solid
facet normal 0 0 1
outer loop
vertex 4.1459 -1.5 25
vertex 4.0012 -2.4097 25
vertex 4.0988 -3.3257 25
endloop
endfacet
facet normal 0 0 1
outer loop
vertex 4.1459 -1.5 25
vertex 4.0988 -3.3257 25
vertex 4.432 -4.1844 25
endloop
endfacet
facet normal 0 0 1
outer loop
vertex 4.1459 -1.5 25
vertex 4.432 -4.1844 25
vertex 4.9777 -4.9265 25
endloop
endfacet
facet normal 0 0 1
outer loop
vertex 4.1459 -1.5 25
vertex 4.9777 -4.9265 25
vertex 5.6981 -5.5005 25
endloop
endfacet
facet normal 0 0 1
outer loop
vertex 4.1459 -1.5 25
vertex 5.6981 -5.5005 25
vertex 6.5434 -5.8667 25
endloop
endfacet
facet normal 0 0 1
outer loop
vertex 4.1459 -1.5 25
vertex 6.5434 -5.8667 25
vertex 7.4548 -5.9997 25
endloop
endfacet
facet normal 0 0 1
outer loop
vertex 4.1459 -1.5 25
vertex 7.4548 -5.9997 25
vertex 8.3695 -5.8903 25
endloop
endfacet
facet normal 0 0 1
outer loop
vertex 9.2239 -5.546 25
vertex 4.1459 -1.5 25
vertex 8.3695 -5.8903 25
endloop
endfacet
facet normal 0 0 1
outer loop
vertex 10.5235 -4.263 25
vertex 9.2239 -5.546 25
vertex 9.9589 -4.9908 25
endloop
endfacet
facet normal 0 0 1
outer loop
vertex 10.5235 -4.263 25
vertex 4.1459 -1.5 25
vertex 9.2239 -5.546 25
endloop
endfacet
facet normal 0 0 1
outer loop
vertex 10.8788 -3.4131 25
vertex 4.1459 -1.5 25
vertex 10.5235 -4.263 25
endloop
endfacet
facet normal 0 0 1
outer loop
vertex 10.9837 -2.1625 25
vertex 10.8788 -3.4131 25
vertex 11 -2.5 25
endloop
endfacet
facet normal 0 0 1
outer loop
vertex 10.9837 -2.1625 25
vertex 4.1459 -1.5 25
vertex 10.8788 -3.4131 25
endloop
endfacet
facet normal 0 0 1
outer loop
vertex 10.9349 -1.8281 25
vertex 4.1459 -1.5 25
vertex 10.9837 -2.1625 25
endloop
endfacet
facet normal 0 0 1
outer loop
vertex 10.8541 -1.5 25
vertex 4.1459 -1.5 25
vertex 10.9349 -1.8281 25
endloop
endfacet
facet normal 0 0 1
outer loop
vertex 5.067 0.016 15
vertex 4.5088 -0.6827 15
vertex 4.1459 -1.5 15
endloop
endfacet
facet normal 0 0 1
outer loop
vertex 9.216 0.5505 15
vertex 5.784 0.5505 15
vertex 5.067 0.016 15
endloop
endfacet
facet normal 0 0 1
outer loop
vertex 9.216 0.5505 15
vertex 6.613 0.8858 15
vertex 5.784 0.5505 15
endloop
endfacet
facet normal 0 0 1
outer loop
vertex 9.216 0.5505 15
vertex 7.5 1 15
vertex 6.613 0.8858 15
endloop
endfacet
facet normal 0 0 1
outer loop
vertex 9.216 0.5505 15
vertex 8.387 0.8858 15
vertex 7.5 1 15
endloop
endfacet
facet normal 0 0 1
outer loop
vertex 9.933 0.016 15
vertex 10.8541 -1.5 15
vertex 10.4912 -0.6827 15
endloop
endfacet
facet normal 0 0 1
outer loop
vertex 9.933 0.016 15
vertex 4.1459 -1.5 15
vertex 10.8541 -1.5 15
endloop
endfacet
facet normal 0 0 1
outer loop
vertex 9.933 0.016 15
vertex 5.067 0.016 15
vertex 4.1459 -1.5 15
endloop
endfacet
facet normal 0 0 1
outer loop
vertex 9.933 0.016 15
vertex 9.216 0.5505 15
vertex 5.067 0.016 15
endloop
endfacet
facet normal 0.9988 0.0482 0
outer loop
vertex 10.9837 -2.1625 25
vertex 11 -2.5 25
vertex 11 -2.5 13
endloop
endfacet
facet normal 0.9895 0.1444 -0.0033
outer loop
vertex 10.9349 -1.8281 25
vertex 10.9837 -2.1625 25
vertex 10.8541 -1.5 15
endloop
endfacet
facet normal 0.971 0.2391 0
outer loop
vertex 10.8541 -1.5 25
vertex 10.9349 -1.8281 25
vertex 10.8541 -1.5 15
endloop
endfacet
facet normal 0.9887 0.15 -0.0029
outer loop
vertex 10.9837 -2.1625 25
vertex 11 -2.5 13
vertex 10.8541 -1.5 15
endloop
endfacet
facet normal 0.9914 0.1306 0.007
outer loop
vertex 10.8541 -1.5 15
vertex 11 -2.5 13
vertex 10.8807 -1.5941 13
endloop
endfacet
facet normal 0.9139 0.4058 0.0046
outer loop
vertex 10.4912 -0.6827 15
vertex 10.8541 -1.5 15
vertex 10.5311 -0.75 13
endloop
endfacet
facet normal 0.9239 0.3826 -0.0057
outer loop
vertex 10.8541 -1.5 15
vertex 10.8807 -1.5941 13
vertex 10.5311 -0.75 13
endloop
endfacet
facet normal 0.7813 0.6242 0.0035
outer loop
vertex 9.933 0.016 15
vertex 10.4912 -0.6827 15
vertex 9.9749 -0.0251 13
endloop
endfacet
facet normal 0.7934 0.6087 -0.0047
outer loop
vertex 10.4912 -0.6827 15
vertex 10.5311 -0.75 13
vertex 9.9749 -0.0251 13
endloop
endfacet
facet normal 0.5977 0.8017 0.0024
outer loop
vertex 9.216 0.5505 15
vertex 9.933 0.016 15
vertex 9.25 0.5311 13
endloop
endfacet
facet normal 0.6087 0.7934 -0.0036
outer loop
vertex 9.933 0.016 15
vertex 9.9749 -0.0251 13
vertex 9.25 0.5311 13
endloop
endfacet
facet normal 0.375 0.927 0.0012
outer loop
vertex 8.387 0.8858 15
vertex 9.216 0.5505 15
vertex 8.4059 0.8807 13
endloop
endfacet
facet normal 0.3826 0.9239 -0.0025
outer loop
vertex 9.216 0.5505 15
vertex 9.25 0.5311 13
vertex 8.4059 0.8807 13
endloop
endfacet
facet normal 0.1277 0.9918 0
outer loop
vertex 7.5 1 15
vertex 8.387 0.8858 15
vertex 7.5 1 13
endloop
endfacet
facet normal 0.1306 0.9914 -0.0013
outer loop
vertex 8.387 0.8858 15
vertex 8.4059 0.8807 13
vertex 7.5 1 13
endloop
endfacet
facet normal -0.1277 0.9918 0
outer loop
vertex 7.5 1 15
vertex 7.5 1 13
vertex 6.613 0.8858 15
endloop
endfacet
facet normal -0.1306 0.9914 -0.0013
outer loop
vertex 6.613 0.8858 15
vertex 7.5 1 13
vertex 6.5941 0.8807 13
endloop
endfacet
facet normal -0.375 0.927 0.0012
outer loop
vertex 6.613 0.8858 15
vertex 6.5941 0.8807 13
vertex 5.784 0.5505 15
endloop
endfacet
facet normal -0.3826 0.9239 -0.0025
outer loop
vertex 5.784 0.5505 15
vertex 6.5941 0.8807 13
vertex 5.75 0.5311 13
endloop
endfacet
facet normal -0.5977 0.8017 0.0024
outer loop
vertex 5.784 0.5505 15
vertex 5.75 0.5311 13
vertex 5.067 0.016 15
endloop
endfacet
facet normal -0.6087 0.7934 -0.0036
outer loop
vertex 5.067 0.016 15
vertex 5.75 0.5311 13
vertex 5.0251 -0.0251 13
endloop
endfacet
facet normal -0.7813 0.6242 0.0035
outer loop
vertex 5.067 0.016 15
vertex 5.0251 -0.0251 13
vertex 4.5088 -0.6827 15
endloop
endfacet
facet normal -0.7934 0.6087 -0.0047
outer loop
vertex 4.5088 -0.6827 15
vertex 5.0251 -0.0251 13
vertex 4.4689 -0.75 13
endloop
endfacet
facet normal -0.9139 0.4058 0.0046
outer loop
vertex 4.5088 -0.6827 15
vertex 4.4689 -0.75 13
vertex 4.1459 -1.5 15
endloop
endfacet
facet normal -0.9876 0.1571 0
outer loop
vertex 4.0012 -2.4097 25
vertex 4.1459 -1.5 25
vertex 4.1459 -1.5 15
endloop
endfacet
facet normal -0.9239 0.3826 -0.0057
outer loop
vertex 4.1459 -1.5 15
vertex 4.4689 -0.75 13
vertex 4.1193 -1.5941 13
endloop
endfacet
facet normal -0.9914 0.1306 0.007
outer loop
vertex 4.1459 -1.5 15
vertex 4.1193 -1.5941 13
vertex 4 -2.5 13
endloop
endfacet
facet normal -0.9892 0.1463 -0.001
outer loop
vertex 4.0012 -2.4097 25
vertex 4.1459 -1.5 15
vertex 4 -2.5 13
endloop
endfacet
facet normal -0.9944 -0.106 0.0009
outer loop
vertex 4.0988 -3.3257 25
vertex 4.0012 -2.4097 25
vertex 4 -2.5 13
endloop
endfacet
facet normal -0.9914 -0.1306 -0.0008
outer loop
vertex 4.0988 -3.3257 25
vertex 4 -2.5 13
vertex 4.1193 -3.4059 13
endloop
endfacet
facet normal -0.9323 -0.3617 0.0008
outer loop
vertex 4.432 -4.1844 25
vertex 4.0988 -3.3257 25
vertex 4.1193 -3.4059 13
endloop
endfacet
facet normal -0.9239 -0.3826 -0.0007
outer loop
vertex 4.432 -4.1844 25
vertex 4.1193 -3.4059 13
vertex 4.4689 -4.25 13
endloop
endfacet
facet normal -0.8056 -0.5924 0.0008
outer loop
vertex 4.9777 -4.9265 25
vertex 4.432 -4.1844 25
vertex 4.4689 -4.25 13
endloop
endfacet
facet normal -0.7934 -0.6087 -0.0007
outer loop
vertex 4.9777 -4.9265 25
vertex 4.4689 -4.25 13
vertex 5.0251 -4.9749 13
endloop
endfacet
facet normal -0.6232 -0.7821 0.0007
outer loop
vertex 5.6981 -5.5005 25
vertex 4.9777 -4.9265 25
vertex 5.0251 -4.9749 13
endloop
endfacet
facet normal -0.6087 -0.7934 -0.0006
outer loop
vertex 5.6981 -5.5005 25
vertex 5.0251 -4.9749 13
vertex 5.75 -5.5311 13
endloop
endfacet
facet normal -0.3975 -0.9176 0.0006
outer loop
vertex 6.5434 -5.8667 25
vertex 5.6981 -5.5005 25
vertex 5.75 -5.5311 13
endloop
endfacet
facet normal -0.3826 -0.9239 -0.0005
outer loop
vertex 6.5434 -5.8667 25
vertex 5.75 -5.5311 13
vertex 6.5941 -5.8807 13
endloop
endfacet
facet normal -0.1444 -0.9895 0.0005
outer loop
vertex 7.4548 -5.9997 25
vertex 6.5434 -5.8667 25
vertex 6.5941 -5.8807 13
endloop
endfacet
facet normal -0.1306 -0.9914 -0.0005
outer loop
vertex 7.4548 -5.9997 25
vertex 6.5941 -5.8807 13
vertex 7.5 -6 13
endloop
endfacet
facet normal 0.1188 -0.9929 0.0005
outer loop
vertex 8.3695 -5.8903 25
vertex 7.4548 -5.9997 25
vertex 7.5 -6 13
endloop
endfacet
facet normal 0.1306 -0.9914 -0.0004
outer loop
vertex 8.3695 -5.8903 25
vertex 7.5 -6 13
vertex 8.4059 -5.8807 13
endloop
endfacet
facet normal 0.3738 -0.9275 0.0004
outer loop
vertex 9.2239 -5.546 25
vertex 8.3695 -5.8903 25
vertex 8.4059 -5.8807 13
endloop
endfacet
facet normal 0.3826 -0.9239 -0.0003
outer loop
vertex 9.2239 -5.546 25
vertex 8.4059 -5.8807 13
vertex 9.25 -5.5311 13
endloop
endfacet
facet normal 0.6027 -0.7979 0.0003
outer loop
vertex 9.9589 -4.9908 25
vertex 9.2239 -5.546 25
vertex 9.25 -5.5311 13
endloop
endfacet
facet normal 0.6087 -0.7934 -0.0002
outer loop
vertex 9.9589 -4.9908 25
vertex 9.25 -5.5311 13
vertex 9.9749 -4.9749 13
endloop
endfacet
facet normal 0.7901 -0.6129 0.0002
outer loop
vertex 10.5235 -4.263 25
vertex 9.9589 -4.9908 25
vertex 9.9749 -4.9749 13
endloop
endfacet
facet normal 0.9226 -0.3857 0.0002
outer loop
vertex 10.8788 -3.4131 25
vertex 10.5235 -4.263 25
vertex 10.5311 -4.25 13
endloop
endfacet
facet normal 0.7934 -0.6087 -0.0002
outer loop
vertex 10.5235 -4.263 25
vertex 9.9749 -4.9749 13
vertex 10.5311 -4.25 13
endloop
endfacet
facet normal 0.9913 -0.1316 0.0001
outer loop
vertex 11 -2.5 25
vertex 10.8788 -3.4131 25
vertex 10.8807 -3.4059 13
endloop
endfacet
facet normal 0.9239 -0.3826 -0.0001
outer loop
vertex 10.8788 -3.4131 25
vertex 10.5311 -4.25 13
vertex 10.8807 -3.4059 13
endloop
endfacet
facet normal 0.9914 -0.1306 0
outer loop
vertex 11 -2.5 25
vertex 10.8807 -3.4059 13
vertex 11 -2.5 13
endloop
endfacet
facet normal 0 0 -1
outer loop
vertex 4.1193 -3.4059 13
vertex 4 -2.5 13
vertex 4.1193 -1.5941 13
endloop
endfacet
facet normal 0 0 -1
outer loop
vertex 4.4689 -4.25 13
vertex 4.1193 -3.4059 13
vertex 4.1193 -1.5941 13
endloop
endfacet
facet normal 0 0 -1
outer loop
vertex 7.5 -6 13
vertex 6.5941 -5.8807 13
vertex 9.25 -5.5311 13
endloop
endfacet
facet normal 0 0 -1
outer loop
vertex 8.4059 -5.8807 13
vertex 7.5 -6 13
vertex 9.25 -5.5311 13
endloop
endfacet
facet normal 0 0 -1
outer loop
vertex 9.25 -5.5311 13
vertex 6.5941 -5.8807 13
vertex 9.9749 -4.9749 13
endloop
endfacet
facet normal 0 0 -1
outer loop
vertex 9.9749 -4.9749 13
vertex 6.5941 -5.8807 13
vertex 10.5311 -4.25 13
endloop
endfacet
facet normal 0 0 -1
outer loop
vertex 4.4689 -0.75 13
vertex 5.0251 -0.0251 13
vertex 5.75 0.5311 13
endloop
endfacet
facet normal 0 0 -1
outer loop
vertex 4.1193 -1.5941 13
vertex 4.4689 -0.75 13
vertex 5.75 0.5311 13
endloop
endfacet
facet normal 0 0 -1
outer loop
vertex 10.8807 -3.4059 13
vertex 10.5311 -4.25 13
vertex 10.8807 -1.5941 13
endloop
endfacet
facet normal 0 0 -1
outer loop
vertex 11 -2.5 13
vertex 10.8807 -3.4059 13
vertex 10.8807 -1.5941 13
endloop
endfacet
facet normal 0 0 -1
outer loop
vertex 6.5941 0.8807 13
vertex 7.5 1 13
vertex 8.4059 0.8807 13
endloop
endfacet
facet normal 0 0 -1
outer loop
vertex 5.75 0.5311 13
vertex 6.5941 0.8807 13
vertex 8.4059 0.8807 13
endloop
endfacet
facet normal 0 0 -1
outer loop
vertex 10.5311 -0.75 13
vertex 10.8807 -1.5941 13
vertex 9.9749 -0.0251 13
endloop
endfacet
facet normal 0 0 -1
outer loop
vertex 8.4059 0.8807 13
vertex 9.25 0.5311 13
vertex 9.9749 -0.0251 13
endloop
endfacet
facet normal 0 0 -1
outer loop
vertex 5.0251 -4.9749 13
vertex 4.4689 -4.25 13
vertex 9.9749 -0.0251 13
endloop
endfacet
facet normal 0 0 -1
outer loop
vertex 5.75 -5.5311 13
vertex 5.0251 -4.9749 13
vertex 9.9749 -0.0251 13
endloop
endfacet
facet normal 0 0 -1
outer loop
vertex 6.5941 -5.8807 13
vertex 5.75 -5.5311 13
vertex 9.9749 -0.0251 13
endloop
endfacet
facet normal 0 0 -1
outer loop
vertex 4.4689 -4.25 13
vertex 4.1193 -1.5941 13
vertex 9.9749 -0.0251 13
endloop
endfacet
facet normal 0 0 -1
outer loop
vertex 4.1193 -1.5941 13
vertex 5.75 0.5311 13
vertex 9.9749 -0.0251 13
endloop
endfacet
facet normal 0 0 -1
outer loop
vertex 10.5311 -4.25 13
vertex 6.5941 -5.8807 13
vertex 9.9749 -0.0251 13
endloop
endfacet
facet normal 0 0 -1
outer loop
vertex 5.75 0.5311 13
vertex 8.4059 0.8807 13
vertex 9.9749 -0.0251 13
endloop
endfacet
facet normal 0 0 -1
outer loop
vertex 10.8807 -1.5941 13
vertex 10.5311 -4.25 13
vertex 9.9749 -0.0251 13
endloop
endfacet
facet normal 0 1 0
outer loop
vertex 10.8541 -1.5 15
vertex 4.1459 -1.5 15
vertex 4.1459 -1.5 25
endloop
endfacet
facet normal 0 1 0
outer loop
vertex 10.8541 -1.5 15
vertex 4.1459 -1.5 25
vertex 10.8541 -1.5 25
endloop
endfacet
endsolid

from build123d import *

# Parameters (mm, degrees)
BOX001_W          = 10
BOX001_H          = 10
BOX001_DEPTH      = 10
CYLINDER002_R     = 3.5
CYLINDER002_DEPTH = 12


with BuildPart() as w_rfel001:
    # Box001 → Box001 (new body)
    with BuildSketch(Plane(origin=(2, -1.5, 15), x_dir=(1, 0, 0), z_dir=(0, 0, 1))):
        with Locations((5, 5)):
            Rectangle(BOX001_W, BOX001_H)
    extrude(amount=BOX001_DEPTH)


with BuildPart() as cut:
    # Cylinder002 → Cylinder002 (new body)
    with BuildSketch(Plane(origin=(7.5, -2.5, 13), x_dir=(1, 0, 0), z_dir=(0, 0, 1))):
        Circle(CYLINDER002_R)
    extrude(amount=CYLINDER002_DEPTH)

    # Cut: cut Würfel001
    add(w_rfel001.part, mode=Mode.SUBTRACT)


solid = cut.part
